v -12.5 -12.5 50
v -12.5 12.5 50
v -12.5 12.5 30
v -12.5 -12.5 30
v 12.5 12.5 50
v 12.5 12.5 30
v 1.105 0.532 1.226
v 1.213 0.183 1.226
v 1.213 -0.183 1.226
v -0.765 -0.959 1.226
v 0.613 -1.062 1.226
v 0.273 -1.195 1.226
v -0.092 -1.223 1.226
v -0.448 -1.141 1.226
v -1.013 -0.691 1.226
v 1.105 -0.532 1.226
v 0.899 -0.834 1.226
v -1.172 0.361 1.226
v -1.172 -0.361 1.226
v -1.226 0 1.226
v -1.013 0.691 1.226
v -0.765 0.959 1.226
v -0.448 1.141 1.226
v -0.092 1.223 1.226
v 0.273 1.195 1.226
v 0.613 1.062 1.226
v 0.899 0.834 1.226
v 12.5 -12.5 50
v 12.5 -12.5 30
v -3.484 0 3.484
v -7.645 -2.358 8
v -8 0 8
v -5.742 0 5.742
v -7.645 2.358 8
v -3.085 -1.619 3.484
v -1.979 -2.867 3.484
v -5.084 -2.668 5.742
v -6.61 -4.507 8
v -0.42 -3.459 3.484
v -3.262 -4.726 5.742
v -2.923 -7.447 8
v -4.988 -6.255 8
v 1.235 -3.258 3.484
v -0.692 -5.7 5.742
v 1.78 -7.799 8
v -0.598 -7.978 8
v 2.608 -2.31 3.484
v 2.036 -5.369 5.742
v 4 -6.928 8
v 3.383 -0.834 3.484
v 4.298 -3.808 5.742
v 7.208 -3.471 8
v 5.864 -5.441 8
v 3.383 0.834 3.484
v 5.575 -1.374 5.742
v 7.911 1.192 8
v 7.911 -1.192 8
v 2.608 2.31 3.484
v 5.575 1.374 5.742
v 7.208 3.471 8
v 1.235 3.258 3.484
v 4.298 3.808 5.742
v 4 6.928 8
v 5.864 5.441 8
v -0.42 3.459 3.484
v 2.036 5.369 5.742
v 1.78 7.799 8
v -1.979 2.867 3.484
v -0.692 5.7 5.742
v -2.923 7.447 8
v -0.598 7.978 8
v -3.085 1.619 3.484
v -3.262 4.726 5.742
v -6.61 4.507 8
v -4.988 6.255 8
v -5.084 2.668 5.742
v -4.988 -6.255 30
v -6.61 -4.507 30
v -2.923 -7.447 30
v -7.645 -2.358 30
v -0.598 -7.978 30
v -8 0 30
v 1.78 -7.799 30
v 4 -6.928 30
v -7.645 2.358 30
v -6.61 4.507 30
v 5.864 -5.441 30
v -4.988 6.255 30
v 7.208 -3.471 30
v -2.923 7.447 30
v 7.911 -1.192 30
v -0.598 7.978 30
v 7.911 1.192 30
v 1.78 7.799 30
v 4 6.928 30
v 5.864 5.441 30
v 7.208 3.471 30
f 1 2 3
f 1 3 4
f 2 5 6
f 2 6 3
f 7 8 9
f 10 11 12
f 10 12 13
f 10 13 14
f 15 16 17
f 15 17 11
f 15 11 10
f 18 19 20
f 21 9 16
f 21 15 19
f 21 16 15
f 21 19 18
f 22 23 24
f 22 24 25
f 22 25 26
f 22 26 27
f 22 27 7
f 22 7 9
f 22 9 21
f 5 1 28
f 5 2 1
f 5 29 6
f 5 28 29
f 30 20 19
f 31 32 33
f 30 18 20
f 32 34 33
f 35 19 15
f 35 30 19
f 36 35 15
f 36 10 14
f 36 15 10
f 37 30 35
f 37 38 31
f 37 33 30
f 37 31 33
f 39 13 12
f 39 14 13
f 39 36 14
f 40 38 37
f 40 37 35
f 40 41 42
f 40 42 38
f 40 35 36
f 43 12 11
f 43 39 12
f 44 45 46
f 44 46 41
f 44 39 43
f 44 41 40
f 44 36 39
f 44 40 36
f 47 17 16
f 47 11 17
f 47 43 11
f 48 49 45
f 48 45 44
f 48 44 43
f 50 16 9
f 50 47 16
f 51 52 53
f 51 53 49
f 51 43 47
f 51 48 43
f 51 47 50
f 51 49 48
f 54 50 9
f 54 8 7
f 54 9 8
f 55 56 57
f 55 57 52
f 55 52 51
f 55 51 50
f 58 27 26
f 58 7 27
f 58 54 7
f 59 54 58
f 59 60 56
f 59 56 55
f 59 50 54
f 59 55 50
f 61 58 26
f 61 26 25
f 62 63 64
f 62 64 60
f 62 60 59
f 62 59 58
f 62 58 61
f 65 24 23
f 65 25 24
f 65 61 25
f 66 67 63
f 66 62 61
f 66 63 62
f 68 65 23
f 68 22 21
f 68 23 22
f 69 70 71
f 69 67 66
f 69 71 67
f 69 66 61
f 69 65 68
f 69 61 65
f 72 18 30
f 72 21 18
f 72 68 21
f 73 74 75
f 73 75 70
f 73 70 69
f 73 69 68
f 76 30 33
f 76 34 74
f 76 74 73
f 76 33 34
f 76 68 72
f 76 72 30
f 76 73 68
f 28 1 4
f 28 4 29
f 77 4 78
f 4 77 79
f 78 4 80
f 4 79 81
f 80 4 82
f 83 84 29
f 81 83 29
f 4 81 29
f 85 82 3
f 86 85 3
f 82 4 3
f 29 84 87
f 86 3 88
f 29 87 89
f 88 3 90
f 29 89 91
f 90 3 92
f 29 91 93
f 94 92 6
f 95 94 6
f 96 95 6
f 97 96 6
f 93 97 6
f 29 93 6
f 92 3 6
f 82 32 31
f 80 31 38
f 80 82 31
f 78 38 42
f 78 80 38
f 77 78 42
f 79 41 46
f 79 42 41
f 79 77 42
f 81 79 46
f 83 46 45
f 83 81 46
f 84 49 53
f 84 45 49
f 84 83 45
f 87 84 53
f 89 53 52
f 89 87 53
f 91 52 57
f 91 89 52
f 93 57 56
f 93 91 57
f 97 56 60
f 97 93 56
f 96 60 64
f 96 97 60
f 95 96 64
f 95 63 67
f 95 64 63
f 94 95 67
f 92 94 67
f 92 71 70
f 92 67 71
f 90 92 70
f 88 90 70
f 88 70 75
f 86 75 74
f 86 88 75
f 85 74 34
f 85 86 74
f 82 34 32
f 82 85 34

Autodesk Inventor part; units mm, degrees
ref_plane "YZ Plane" through (0, 0, 0) normal (1, 0, 0) x (0, 1, 0)
ref_plane "XZ Plane" through (0, 0, 0) normal (0, 1, 0) x (-1, 0, 0)
ref_plane "XY Plane" through (0, 0, 0) normal (0, 0, 1) x (1, 0, 0)
sketch "Sketch1" plane through (0, 0, 0) normal (0, 1, 0) x (-1, 0, 0)
  line L0 (1.2262, 1.2262) -> (8, 8)
  line L1 (8, 8) -> (8, 50)
  line L2 (8, 50) -> (0, 50)
  line L3 (0, 50) -> (0, 1.2262)
  line L4 (0, 1.2262) -> (1.2262, 1.2262)
  point P0 (0, 0)
  dimension "d0" = 50
  dimension "d1" = 8
  dimension "d2" = 135
revolve "Revolution1" add sketch "Sketch1" angle 360 about axis through (0, 0, 50) along (0, 0, -1)
sketch "Sketch2" plane through (0, 0, 50) normal (0, 0, 1) x (1, 0, 0)
  circle A0 centre (0, 0) radius 8 projected
  line L0 (-12.5, -12.5) -> (12.5, -12.5)
  line L1 (12.5, -12.5) -> (12.5, 12.5)
  line L2 (12.5, 12.5) -> (-12.5, 12.5)
  line L3 (-12.5, 12.5) -> (-12.5, -12.5)
  line L4 (-12.5, -12.5) -> (12.5, 12.5) construction
  line L5 (12.5, -12.5) -> (-12.5, 12.5) construction
  dimension "d4" = 25
  dimension "d6" = 25
extrude "Extrusion1" add sketch "Sketch2" against normal blind 20
properties part number "effector"
